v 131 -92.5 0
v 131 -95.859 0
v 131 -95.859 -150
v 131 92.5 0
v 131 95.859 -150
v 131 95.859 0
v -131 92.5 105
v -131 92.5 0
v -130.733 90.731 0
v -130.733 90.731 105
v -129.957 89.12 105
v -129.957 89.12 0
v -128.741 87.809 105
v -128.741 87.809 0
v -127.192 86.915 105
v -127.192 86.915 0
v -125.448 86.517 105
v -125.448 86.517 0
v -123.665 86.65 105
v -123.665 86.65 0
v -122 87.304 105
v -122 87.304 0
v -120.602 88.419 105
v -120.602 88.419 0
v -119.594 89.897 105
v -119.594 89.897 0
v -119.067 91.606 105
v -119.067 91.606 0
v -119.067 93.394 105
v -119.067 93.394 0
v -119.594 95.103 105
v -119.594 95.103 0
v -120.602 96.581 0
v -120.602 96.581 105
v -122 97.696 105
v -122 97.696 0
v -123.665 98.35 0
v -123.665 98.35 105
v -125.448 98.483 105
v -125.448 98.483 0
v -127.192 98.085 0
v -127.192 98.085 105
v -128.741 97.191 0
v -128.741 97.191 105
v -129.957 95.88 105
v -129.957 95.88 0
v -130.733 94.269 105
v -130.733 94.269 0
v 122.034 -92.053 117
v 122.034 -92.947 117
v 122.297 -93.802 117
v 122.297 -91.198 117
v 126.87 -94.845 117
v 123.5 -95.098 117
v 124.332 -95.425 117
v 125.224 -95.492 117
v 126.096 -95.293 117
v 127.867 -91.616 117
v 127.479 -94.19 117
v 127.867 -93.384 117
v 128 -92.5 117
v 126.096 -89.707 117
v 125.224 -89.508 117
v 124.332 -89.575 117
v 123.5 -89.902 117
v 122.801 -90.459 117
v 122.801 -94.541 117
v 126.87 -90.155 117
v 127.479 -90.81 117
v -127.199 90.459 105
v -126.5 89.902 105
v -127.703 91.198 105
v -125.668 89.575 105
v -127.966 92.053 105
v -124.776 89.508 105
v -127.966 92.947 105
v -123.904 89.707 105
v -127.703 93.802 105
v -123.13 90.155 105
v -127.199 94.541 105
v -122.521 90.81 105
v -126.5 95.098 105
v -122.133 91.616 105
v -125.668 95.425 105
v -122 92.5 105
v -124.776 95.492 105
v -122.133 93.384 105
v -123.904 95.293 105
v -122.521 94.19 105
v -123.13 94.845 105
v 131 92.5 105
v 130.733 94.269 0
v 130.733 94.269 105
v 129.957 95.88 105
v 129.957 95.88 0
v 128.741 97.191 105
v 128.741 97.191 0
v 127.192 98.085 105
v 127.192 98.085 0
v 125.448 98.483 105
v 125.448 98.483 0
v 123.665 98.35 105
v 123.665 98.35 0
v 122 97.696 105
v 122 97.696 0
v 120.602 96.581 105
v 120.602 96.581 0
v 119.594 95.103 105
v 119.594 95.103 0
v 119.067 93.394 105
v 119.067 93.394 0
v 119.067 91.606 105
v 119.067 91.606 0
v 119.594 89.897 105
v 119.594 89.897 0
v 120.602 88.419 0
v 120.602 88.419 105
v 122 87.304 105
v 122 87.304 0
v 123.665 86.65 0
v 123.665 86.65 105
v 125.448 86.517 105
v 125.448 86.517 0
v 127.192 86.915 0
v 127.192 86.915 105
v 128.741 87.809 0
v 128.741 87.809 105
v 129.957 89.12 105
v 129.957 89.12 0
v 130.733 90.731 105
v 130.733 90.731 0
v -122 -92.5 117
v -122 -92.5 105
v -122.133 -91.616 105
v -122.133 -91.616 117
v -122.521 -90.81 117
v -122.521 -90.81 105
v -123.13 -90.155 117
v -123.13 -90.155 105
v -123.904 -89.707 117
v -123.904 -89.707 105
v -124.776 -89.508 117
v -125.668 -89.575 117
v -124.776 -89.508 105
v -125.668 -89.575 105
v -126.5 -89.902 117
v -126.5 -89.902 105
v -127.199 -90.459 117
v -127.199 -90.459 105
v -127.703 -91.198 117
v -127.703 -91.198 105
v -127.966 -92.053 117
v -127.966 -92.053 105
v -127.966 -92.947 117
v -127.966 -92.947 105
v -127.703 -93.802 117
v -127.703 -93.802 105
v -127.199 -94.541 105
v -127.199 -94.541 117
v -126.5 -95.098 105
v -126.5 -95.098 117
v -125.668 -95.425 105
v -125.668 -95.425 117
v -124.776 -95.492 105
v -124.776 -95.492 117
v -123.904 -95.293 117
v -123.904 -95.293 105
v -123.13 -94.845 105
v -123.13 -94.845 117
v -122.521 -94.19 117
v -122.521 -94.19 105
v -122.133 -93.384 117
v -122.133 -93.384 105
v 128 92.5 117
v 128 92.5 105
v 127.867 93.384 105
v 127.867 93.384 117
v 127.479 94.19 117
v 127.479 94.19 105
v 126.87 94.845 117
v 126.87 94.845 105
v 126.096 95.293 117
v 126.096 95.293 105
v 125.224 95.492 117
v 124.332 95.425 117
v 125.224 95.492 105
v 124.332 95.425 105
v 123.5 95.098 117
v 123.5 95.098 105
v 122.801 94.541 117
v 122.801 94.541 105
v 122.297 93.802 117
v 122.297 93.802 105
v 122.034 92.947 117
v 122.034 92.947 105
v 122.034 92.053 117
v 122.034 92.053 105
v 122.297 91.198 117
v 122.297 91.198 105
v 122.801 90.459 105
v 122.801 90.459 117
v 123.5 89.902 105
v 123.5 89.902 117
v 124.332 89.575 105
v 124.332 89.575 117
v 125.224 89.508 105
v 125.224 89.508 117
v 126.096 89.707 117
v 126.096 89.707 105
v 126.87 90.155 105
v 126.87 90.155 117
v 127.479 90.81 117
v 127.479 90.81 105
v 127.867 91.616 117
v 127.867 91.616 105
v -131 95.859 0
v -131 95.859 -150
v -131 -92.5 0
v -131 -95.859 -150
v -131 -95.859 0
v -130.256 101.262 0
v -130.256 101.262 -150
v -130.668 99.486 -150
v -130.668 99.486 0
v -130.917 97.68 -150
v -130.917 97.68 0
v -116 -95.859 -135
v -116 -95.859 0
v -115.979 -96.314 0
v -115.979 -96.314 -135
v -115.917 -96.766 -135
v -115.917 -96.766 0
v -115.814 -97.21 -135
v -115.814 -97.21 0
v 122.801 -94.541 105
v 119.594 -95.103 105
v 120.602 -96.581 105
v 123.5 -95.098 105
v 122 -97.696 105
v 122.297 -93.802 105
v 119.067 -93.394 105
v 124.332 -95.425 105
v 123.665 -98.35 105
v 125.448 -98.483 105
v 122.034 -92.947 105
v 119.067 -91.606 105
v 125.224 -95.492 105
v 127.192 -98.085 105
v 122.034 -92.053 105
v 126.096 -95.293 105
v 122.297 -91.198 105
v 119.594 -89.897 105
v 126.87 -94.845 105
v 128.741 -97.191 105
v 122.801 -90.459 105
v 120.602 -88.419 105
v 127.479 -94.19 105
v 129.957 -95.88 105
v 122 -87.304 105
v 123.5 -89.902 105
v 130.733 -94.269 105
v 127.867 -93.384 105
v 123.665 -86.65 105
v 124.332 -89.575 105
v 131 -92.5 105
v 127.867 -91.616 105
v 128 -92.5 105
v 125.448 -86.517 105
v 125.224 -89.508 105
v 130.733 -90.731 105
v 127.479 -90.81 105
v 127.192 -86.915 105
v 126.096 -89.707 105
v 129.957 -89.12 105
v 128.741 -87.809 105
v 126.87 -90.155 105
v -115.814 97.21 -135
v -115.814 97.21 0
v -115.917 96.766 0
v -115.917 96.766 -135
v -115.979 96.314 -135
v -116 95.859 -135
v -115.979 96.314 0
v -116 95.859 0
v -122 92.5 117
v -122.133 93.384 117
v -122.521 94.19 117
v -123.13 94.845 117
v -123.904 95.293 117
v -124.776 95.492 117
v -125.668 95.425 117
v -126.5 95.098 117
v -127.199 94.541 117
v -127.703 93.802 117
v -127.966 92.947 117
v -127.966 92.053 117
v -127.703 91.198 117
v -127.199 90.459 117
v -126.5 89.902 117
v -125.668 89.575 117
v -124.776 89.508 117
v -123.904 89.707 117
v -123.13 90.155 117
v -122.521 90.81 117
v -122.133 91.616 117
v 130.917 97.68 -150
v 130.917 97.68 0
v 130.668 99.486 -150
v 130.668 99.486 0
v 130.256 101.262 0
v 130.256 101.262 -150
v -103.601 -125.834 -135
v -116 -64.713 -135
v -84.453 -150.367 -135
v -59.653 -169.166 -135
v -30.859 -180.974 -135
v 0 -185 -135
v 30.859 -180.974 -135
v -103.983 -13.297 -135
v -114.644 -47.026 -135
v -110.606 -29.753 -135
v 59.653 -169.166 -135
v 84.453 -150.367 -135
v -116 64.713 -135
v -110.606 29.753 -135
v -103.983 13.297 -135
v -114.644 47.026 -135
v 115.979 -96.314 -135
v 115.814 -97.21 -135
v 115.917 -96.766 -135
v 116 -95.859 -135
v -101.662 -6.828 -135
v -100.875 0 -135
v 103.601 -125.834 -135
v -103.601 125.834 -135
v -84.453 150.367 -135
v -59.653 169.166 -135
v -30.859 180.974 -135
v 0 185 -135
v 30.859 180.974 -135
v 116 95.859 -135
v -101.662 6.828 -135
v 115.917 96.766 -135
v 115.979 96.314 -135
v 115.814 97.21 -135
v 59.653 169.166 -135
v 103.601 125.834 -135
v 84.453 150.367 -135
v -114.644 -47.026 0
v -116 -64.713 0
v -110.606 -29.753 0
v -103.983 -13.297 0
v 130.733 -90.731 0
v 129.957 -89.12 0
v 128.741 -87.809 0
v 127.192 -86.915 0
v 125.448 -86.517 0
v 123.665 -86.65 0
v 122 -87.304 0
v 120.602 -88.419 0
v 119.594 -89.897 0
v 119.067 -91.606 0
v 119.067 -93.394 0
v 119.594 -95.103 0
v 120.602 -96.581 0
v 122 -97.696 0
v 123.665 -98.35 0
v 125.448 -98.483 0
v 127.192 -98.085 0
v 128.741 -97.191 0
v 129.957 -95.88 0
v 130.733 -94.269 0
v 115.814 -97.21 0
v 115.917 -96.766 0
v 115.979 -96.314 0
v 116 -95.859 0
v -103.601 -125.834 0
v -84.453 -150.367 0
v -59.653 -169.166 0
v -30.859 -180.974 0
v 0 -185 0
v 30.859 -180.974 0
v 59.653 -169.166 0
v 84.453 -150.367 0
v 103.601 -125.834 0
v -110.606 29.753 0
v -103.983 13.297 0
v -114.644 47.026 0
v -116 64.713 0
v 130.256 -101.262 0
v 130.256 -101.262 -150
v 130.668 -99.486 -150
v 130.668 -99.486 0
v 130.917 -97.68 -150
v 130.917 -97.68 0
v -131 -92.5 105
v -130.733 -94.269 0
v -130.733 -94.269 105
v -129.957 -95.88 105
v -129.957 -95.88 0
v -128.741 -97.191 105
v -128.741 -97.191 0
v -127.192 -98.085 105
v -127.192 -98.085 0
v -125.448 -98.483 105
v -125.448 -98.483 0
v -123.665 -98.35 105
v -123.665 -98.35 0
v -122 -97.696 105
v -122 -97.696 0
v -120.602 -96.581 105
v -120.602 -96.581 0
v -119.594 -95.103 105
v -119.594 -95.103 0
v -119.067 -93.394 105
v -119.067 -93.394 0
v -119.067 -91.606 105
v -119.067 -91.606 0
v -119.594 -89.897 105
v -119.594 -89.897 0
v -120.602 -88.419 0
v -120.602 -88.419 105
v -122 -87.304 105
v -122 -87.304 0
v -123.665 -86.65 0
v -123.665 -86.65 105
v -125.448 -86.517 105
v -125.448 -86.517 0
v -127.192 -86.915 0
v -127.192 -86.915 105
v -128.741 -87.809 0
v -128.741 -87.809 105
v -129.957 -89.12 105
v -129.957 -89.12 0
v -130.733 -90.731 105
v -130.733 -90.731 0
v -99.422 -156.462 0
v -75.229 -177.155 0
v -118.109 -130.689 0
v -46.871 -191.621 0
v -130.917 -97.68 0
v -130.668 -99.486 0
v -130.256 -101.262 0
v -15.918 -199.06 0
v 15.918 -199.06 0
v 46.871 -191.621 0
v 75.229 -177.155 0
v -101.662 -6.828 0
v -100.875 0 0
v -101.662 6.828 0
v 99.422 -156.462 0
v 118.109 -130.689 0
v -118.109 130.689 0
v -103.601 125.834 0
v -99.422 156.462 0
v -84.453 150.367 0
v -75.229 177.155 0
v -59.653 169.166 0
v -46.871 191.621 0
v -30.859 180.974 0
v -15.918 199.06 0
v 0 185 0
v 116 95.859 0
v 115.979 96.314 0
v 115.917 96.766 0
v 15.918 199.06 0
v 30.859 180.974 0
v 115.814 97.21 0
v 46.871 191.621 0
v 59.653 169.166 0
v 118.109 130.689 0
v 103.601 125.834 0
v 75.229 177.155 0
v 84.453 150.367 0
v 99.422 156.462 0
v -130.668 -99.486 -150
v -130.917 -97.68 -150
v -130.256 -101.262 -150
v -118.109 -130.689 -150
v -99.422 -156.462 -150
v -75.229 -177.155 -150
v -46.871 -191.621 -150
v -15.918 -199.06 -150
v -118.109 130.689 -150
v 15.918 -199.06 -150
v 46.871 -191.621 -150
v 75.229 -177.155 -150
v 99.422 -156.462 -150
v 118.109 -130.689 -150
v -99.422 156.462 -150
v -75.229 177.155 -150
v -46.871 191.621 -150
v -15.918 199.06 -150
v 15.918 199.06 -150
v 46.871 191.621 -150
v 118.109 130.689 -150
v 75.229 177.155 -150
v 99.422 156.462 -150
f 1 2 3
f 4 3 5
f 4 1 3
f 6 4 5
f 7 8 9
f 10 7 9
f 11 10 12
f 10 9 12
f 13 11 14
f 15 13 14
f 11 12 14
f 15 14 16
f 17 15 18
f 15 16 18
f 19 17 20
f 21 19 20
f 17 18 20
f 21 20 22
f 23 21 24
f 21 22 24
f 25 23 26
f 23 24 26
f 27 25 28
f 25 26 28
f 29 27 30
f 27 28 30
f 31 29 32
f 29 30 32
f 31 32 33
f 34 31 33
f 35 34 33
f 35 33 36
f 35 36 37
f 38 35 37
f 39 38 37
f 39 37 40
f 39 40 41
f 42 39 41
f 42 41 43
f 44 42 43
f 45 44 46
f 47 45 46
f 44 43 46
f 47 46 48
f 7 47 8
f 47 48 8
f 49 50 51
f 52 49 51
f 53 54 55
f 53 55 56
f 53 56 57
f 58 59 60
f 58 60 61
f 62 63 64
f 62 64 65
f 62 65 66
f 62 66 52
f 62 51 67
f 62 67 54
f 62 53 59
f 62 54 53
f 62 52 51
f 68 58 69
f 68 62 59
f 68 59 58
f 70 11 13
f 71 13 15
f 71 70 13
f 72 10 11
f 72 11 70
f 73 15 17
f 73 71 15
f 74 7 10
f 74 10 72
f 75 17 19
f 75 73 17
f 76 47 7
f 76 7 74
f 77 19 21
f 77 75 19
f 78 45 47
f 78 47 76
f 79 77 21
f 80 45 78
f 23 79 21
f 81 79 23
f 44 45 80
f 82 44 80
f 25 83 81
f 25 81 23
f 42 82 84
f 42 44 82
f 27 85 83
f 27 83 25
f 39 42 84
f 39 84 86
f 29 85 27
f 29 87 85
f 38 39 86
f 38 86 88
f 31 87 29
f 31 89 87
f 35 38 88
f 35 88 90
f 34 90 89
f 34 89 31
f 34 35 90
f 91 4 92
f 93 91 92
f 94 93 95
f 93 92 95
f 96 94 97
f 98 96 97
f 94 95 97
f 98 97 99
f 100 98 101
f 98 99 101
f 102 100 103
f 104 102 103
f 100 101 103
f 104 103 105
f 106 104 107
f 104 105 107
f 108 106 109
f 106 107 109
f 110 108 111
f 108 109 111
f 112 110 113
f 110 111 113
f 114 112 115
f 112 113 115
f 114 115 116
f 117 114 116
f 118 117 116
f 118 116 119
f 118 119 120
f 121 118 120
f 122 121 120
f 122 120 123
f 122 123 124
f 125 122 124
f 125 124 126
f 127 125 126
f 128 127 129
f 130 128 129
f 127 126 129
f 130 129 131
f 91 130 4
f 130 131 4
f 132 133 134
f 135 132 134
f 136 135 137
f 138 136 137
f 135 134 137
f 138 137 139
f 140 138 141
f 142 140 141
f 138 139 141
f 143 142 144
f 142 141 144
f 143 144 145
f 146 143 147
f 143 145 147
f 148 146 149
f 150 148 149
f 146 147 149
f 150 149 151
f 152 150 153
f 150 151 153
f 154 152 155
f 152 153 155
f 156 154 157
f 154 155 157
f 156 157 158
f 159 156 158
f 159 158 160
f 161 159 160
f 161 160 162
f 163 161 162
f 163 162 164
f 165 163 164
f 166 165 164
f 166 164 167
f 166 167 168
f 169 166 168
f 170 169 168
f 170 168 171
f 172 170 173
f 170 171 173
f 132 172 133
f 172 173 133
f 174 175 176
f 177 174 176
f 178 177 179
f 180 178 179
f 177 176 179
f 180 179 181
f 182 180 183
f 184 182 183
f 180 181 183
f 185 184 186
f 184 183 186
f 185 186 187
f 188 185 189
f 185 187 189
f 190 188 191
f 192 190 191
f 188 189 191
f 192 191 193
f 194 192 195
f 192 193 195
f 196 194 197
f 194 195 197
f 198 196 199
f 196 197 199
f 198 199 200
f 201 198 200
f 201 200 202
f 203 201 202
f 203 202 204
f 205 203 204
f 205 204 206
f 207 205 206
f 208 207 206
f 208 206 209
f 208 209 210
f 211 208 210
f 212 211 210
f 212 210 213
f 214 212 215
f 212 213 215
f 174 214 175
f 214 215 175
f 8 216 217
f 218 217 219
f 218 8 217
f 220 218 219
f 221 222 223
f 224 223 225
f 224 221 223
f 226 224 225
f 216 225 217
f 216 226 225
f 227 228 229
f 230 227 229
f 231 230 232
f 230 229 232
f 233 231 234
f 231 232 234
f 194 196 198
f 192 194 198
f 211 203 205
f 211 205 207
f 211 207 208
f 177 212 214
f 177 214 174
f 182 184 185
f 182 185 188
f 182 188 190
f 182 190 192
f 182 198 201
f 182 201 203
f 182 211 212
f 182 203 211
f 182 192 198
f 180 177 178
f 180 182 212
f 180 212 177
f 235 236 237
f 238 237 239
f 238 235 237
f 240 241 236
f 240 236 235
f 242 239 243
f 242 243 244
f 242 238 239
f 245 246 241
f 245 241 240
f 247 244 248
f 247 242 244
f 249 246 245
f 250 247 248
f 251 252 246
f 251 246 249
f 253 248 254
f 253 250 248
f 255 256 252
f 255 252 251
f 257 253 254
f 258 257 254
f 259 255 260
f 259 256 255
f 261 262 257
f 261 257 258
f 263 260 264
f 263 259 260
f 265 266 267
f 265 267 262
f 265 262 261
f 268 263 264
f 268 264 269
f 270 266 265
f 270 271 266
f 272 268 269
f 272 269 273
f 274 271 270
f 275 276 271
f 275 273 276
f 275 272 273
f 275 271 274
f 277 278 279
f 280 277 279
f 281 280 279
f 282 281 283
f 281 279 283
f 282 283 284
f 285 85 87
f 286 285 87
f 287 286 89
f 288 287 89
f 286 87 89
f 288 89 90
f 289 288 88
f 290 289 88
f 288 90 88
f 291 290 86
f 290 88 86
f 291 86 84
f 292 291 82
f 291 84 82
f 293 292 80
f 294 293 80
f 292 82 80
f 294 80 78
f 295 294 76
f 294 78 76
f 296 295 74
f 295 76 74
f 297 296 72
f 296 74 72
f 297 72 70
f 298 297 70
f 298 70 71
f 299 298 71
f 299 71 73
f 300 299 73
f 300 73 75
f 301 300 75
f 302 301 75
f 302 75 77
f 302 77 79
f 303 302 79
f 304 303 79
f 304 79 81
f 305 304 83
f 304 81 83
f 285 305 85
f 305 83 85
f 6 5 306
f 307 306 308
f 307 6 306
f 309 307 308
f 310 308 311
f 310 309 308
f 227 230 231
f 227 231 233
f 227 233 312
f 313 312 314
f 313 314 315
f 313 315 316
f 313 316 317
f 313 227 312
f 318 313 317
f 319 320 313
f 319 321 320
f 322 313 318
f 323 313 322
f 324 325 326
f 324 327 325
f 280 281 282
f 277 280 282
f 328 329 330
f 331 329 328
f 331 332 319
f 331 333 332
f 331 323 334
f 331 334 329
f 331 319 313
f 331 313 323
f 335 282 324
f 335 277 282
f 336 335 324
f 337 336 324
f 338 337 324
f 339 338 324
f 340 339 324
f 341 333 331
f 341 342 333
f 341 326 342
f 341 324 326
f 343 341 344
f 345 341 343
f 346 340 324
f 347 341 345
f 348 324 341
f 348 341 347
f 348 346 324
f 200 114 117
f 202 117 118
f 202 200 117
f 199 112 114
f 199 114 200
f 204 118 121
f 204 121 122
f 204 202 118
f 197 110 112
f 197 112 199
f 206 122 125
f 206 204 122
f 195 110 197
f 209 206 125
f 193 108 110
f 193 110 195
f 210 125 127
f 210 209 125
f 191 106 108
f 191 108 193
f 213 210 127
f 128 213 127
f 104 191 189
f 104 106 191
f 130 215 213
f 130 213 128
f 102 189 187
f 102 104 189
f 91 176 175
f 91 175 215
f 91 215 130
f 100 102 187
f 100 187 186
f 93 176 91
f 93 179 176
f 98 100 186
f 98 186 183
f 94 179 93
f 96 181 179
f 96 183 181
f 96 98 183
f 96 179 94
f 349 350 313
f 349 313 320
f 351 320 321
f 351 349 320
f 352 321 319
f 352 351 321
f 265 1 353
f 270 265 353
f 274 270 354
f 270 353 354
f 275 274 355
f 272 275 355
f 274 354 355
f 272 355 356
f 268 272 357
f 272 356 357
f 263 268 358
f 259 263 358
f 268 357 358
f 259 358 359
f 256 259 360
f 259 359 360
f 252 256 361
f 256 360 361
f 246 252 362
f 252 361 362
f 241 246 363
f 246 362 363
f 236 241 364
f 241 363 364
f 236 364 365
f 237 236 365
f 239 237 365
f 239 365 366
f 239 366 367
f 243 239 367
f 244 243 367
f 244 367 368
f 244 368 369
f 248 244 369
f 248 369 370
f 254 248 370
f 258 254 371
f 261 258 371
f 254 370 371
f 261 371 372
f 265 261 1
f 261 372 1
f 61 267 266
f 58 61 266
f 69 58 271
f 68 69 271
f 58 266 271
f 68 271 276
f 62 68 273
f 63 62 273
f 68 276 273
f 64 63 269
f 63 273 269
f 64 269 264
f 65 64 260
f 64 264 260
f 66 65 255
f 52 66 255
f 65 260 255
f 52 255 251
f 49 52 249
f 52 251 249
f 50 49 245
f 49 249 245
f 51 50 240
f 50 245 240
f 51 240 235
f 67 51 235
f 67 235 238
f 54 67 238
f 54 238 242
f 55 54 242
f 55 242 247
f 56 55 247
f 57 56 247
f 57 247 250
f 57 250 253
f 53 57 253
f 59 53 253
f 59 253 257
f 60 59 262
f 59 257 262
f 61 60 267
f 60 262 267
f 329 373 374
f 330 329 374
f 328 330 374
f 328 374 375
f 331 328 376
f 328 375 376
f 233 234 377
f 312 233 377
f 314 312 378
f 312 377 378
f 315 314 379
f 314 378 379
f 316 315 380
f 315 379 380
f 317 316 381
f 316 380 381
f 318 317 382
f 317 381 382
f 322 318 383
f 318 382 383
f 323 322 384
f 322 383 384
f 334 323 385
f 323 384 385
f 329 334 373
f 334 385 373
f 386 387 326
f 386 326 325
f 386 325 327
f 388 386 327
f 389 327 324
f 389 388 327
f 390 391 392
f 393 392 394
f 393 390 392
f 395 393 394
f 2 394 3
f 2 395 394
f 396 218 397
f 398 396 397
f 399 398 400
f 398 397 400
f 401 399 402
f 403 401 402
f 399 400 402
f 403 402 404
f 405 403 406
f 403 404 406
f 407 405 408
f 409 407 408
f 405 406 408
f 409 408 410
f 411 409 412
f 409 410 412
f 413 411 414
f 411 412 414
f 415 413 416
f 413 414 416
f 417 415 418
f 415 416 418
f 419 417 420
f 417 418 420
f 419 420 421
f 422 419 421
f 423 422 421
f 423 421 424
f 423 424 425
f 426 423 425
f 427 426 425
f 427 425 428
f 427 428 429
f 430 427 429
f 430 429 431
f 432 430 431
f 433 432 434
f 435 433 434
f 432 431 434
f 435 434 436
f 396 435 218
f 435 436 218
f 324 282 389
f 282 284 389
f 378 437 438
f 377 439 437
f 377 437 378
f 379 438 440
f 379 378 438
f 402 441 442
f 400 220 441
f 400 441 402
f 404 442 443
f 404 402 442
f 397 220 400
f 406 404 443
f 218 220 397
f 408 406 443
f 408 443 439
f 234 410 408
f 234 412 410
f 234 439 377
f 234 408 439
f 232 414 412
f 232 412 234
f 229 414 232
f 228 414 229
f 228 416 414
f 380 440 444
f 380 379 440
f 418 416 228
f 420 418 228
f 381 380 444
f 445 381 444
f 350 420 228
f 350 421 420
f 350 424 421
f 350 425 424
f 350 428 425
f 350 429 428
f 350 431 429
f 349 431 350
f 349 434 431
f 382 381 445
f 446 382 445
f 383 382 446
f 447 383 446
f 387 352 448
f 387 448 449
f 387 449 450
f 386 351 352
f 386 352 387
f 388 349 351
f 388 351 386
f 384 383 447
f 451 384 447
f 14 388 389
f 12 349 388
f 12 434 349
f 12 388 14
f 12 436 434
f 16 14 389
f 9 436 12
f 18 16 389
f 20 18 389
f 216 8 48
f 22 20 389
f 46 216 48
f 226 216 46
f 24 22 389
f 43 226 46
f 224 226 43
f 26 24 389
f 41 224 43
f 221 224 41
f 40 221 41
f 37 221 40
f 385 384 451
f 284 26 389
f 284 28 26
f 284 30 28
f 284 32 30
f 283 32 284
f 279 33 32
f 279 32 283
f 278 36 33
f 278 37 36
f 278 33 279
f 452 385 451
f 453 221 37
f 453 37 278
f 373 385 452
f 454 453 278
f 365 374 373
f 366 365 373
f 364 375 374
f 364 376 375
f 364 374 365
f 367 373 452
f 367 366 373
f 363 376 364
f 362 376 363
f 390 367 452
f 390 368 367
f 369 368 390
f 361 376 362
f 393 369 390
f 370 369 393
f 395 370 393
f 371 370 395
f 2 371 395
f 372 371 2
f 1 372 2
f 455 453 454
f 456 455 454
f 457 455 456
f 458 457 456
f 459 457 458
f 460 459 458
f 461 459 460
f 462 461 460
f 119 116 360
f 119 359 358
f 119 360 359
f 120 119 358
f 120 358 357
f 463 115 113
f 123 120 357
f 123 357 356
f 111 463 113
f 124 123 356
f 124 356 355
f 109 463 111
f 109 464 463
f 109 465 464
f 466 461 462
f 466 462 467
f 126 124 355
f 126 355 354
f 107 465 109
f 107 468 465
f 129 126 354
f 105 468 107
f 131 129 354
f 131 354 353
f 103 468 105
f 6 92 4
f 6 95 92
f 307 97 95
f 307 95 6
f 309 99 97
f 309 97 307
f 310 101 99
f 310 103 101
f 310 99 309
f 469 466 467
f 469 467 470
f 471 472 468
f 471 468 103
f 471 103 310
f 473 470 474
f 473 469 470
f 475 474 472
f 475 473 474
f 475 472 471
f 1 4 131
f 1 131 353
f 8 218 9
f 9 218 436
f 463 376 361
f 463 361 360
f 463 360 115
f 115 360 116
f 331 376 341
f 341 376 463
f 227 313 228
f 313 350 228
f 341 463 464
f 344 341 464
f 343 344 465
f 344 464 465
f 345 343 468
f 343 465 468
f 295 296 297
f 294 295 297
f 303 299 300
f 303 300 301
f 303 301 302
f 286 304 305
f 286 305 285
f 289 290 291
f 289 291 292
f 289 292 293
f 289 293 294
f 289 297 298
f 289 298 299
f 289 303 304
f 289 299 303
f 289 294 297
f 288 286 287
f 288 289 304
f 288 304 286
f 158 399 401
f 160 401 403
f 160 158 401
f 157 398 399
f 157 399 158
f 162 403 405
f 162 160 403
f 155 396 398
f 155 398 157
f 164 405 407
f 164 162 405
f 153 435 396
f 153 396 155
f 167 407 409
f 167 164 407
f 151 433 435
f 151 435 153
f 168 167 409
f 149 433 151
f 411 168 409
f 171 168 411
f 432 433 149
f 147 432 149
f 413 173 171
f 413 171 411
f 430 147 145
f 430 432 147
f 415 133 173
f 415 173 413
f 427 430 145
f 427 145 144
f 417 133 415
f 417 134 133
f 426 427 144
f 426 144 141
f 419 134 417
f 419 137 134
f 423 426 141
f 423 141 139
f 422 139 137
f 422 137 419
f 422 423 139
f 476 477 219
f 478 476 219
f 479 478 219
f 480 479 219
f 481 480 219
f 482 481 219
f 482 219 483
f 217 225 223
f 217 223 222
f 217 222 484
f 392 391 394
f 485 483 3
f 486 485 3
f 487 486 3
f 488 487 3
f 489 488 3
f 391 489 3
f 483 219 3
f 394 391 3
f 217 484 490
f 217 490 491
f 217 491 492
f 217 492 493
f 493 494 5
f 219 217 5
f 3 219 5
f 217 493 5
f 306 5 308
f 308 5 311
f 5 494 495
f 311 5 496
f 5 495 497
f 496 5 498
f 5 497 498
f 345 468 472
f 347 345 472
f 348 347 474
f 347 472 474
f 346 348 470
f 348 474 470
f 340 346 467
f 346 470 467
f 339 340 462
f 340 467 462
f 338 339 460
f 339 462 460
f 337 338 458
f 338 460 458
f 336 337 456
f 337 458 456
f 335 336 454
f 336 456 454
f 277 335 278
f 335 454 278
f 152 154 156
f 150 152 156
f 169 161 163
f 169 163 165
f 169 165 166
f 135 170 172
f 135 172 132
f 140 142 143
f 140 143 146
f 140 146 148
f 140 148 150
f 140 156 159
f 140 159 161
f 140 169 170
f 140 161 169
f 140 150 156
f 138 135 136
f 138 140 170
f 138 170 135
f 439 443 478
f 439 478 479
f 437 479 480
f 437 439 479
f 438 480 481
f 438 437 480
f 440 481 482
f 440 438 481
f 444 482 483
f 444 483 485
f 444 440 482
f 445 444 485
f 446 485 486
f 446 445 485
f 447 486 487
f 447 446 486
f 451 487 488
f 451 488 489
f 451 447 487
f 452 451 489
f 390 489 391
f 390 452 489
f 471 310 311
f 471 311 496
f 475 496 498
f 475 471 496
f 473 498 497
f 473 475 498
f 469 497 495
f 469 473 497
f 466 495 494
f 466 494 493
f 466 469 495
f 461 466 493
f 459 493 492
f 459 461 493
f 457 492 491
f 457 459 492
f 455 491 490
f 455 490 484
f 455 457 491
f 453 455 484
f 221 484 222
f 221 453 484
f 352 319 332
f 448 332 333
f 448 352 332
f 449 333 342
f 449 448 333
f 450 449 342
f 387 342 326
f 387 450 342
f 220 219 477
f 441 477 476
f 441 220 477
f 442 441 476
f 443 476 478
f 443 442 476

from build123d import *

# Parameters (mm, degrees)
F0_R     = 6
F1_DEPTH = 150
F2_T     = -15
F4_DEPTH = 135
F5_DEPTH = 105
F6_R     = 3
F7_DEPTH = 12


# Not quite as in the source:
# - a feature names something its author has since deleted; it is built from what else it names


with BuildPart() as f1:
    # F0 (on Top) → F1 (new body)
    with BuildSketch(Plane.XY):
        with BuildLine():
            Line((-131, -92.5), (-131, -95.859159479))
            ThreePointArc((-131, -95.859159479), (-130.8132026368, -98.5862460693), (-130.2562998729, -101.2623914012))
            ThreePointArc((-130.2562998729, -101.2623914012), (0, -200), (130.2562998729, -101.2623914012))
            ThreePointArc((130.2562998729, -101.2623914012), (130.8132026368, -98.5862460693), (131, -95.859159479))
            Line((131, -95.859159479), (131, -92.5))
            Line((131, -92.5), (131, 92.5))
            Line((131, 92.5), (131, 95.859159479))
            ThreePointArc((131, 95.859159479), (130.8132026368, 98.5862460693), (130.2562998729, 101.2623914012))
            ThreePointArc((130.2562998729, 101.2623914012), (0, 200), (-130.2562998729, 101.2623914012))
            ThreePointArc((-130.2562998729, 101.2623914012), (-130.8132026368, 98.5862460693), (-131, 95.859159479))
            Line((-131, 95.859159479), (-131, 92.5000001623))
            Line((-131, 92.5000001623), (-131, -92.5))
        make_face()
        with BuildLine():
            ThreePointArc((-119, -92.5), (-125, -98.5), (-131, -92.5))
            ThreePointArc((-131, -92.5), (-125, -86.5), (-119, -92.5))
        make_face(mode=Mode.SUBTRACT)
        with Locations((125, -92.5)):
            Circle(F0_R, mode=Mode.SUBTRACT)
        with BuildLine():
            ThreePointArc((-119, 92.5), (-125.0000000812, 86.5), (-131, 92.5000001623))
            ThreePointArc((-131, 92.5000001623), (-124.9999999188, 98.5), (-119, 92.5))
        make_face(mode=Mode.SUBTRACT)
        with Locations((125, 92.5)):
            Circle(F0_R, mode=Mode.SUBTRACT)
        with BuildLine():
            ThreePointArc((-119, -92.5), (-125, -86.5), (-131, -92.5))
            ThreePointArc((-131, -92.5), (-125, -98.5), (-119, -92.5))
        make_face()
        with BuildLine():
            ThreePointArc((-119, 92.5), (-124.9999999188, 98.5), (-131, 92.5000001623))
            ThreePointArc((-131, 92.5000001623), (-125.0000000812, 86.5), (-119, 92.5))
        make_face()
        with Locations((125, -92.5)):
            Circle(F0_R)
        with Locations((125, 92.5)):
            Circle(F0_R)
    extrude(amount=-F1_DEPTH)

    # F2
    f2_openings = [f1.faces().sort_by_distance(p)[0] for p in [
        (0, 0, 0),
    ]]
    offset(amount=F2_T, openings=f2_openings)

    # F3 (on face) → F4 (join, through all)
    with BuildSketch(Plane.XY):
        with BuildLine():
            ThreePointArc((-103.9827400965, 13.2972029152), (-112.95573879, 38.3122762743), (-116, 64.7130541872))
            Line((-116, 64.7130541872), (-116, -64.7130541872))
            ThreePointArc((-116, -64.7130541872), (-112.95573879, -38.3122762743), (-103.9827400965, -13.2972029152))
            ThreePointArc((-103.9827400965, -13.2972029152), (-100.8748280525, 0), (-103.9827400965, 13.2972029152))
        make_face()
    extrude(amount=-F4_DEPTH)

    # F0 (on Top) → F5 (join)
    with BuildSketch(Plane.XY):
        with Locations((125, -92.5)):
            Circle(F0_R)
        with Locations((125, 92.5)):
            Circle(F0_R)
        with BuildLine():
            ThreePointArc((-119, 92.5), (-124.9999999188, 98.5), (-131, 92.5000001623))
            ThreePointArc((-131, 92.5000001623), (-125.0000000812, 86.5), (-119, 92.5))
        make_face()
        with BuildLine():
            ThreePointArc((-119, -92.5), (-125, -86.5), (-131, -92.5))
            ThreePointArc((-131, -92.5), (-125, -98.5), (-119, -92.5))
        make_face()
    extrude(amount=F5_DEPTH)

    # F6 (on face) → F7 (join)
    with BuildSketch(Plane.XY.offset(105)):
        with Locations((125, -92.5)):
            Circle(F6_R)
        with Locations((-125, -92.5)):
            Circle(F6_R)
        with Locations((125, 92.5)):
            Circle(F6_R)
        with Locations((-125, 92.5)):
            Circle(F6_R)
    extrude(amount=F7_DEPTH)


solid = f1.part
